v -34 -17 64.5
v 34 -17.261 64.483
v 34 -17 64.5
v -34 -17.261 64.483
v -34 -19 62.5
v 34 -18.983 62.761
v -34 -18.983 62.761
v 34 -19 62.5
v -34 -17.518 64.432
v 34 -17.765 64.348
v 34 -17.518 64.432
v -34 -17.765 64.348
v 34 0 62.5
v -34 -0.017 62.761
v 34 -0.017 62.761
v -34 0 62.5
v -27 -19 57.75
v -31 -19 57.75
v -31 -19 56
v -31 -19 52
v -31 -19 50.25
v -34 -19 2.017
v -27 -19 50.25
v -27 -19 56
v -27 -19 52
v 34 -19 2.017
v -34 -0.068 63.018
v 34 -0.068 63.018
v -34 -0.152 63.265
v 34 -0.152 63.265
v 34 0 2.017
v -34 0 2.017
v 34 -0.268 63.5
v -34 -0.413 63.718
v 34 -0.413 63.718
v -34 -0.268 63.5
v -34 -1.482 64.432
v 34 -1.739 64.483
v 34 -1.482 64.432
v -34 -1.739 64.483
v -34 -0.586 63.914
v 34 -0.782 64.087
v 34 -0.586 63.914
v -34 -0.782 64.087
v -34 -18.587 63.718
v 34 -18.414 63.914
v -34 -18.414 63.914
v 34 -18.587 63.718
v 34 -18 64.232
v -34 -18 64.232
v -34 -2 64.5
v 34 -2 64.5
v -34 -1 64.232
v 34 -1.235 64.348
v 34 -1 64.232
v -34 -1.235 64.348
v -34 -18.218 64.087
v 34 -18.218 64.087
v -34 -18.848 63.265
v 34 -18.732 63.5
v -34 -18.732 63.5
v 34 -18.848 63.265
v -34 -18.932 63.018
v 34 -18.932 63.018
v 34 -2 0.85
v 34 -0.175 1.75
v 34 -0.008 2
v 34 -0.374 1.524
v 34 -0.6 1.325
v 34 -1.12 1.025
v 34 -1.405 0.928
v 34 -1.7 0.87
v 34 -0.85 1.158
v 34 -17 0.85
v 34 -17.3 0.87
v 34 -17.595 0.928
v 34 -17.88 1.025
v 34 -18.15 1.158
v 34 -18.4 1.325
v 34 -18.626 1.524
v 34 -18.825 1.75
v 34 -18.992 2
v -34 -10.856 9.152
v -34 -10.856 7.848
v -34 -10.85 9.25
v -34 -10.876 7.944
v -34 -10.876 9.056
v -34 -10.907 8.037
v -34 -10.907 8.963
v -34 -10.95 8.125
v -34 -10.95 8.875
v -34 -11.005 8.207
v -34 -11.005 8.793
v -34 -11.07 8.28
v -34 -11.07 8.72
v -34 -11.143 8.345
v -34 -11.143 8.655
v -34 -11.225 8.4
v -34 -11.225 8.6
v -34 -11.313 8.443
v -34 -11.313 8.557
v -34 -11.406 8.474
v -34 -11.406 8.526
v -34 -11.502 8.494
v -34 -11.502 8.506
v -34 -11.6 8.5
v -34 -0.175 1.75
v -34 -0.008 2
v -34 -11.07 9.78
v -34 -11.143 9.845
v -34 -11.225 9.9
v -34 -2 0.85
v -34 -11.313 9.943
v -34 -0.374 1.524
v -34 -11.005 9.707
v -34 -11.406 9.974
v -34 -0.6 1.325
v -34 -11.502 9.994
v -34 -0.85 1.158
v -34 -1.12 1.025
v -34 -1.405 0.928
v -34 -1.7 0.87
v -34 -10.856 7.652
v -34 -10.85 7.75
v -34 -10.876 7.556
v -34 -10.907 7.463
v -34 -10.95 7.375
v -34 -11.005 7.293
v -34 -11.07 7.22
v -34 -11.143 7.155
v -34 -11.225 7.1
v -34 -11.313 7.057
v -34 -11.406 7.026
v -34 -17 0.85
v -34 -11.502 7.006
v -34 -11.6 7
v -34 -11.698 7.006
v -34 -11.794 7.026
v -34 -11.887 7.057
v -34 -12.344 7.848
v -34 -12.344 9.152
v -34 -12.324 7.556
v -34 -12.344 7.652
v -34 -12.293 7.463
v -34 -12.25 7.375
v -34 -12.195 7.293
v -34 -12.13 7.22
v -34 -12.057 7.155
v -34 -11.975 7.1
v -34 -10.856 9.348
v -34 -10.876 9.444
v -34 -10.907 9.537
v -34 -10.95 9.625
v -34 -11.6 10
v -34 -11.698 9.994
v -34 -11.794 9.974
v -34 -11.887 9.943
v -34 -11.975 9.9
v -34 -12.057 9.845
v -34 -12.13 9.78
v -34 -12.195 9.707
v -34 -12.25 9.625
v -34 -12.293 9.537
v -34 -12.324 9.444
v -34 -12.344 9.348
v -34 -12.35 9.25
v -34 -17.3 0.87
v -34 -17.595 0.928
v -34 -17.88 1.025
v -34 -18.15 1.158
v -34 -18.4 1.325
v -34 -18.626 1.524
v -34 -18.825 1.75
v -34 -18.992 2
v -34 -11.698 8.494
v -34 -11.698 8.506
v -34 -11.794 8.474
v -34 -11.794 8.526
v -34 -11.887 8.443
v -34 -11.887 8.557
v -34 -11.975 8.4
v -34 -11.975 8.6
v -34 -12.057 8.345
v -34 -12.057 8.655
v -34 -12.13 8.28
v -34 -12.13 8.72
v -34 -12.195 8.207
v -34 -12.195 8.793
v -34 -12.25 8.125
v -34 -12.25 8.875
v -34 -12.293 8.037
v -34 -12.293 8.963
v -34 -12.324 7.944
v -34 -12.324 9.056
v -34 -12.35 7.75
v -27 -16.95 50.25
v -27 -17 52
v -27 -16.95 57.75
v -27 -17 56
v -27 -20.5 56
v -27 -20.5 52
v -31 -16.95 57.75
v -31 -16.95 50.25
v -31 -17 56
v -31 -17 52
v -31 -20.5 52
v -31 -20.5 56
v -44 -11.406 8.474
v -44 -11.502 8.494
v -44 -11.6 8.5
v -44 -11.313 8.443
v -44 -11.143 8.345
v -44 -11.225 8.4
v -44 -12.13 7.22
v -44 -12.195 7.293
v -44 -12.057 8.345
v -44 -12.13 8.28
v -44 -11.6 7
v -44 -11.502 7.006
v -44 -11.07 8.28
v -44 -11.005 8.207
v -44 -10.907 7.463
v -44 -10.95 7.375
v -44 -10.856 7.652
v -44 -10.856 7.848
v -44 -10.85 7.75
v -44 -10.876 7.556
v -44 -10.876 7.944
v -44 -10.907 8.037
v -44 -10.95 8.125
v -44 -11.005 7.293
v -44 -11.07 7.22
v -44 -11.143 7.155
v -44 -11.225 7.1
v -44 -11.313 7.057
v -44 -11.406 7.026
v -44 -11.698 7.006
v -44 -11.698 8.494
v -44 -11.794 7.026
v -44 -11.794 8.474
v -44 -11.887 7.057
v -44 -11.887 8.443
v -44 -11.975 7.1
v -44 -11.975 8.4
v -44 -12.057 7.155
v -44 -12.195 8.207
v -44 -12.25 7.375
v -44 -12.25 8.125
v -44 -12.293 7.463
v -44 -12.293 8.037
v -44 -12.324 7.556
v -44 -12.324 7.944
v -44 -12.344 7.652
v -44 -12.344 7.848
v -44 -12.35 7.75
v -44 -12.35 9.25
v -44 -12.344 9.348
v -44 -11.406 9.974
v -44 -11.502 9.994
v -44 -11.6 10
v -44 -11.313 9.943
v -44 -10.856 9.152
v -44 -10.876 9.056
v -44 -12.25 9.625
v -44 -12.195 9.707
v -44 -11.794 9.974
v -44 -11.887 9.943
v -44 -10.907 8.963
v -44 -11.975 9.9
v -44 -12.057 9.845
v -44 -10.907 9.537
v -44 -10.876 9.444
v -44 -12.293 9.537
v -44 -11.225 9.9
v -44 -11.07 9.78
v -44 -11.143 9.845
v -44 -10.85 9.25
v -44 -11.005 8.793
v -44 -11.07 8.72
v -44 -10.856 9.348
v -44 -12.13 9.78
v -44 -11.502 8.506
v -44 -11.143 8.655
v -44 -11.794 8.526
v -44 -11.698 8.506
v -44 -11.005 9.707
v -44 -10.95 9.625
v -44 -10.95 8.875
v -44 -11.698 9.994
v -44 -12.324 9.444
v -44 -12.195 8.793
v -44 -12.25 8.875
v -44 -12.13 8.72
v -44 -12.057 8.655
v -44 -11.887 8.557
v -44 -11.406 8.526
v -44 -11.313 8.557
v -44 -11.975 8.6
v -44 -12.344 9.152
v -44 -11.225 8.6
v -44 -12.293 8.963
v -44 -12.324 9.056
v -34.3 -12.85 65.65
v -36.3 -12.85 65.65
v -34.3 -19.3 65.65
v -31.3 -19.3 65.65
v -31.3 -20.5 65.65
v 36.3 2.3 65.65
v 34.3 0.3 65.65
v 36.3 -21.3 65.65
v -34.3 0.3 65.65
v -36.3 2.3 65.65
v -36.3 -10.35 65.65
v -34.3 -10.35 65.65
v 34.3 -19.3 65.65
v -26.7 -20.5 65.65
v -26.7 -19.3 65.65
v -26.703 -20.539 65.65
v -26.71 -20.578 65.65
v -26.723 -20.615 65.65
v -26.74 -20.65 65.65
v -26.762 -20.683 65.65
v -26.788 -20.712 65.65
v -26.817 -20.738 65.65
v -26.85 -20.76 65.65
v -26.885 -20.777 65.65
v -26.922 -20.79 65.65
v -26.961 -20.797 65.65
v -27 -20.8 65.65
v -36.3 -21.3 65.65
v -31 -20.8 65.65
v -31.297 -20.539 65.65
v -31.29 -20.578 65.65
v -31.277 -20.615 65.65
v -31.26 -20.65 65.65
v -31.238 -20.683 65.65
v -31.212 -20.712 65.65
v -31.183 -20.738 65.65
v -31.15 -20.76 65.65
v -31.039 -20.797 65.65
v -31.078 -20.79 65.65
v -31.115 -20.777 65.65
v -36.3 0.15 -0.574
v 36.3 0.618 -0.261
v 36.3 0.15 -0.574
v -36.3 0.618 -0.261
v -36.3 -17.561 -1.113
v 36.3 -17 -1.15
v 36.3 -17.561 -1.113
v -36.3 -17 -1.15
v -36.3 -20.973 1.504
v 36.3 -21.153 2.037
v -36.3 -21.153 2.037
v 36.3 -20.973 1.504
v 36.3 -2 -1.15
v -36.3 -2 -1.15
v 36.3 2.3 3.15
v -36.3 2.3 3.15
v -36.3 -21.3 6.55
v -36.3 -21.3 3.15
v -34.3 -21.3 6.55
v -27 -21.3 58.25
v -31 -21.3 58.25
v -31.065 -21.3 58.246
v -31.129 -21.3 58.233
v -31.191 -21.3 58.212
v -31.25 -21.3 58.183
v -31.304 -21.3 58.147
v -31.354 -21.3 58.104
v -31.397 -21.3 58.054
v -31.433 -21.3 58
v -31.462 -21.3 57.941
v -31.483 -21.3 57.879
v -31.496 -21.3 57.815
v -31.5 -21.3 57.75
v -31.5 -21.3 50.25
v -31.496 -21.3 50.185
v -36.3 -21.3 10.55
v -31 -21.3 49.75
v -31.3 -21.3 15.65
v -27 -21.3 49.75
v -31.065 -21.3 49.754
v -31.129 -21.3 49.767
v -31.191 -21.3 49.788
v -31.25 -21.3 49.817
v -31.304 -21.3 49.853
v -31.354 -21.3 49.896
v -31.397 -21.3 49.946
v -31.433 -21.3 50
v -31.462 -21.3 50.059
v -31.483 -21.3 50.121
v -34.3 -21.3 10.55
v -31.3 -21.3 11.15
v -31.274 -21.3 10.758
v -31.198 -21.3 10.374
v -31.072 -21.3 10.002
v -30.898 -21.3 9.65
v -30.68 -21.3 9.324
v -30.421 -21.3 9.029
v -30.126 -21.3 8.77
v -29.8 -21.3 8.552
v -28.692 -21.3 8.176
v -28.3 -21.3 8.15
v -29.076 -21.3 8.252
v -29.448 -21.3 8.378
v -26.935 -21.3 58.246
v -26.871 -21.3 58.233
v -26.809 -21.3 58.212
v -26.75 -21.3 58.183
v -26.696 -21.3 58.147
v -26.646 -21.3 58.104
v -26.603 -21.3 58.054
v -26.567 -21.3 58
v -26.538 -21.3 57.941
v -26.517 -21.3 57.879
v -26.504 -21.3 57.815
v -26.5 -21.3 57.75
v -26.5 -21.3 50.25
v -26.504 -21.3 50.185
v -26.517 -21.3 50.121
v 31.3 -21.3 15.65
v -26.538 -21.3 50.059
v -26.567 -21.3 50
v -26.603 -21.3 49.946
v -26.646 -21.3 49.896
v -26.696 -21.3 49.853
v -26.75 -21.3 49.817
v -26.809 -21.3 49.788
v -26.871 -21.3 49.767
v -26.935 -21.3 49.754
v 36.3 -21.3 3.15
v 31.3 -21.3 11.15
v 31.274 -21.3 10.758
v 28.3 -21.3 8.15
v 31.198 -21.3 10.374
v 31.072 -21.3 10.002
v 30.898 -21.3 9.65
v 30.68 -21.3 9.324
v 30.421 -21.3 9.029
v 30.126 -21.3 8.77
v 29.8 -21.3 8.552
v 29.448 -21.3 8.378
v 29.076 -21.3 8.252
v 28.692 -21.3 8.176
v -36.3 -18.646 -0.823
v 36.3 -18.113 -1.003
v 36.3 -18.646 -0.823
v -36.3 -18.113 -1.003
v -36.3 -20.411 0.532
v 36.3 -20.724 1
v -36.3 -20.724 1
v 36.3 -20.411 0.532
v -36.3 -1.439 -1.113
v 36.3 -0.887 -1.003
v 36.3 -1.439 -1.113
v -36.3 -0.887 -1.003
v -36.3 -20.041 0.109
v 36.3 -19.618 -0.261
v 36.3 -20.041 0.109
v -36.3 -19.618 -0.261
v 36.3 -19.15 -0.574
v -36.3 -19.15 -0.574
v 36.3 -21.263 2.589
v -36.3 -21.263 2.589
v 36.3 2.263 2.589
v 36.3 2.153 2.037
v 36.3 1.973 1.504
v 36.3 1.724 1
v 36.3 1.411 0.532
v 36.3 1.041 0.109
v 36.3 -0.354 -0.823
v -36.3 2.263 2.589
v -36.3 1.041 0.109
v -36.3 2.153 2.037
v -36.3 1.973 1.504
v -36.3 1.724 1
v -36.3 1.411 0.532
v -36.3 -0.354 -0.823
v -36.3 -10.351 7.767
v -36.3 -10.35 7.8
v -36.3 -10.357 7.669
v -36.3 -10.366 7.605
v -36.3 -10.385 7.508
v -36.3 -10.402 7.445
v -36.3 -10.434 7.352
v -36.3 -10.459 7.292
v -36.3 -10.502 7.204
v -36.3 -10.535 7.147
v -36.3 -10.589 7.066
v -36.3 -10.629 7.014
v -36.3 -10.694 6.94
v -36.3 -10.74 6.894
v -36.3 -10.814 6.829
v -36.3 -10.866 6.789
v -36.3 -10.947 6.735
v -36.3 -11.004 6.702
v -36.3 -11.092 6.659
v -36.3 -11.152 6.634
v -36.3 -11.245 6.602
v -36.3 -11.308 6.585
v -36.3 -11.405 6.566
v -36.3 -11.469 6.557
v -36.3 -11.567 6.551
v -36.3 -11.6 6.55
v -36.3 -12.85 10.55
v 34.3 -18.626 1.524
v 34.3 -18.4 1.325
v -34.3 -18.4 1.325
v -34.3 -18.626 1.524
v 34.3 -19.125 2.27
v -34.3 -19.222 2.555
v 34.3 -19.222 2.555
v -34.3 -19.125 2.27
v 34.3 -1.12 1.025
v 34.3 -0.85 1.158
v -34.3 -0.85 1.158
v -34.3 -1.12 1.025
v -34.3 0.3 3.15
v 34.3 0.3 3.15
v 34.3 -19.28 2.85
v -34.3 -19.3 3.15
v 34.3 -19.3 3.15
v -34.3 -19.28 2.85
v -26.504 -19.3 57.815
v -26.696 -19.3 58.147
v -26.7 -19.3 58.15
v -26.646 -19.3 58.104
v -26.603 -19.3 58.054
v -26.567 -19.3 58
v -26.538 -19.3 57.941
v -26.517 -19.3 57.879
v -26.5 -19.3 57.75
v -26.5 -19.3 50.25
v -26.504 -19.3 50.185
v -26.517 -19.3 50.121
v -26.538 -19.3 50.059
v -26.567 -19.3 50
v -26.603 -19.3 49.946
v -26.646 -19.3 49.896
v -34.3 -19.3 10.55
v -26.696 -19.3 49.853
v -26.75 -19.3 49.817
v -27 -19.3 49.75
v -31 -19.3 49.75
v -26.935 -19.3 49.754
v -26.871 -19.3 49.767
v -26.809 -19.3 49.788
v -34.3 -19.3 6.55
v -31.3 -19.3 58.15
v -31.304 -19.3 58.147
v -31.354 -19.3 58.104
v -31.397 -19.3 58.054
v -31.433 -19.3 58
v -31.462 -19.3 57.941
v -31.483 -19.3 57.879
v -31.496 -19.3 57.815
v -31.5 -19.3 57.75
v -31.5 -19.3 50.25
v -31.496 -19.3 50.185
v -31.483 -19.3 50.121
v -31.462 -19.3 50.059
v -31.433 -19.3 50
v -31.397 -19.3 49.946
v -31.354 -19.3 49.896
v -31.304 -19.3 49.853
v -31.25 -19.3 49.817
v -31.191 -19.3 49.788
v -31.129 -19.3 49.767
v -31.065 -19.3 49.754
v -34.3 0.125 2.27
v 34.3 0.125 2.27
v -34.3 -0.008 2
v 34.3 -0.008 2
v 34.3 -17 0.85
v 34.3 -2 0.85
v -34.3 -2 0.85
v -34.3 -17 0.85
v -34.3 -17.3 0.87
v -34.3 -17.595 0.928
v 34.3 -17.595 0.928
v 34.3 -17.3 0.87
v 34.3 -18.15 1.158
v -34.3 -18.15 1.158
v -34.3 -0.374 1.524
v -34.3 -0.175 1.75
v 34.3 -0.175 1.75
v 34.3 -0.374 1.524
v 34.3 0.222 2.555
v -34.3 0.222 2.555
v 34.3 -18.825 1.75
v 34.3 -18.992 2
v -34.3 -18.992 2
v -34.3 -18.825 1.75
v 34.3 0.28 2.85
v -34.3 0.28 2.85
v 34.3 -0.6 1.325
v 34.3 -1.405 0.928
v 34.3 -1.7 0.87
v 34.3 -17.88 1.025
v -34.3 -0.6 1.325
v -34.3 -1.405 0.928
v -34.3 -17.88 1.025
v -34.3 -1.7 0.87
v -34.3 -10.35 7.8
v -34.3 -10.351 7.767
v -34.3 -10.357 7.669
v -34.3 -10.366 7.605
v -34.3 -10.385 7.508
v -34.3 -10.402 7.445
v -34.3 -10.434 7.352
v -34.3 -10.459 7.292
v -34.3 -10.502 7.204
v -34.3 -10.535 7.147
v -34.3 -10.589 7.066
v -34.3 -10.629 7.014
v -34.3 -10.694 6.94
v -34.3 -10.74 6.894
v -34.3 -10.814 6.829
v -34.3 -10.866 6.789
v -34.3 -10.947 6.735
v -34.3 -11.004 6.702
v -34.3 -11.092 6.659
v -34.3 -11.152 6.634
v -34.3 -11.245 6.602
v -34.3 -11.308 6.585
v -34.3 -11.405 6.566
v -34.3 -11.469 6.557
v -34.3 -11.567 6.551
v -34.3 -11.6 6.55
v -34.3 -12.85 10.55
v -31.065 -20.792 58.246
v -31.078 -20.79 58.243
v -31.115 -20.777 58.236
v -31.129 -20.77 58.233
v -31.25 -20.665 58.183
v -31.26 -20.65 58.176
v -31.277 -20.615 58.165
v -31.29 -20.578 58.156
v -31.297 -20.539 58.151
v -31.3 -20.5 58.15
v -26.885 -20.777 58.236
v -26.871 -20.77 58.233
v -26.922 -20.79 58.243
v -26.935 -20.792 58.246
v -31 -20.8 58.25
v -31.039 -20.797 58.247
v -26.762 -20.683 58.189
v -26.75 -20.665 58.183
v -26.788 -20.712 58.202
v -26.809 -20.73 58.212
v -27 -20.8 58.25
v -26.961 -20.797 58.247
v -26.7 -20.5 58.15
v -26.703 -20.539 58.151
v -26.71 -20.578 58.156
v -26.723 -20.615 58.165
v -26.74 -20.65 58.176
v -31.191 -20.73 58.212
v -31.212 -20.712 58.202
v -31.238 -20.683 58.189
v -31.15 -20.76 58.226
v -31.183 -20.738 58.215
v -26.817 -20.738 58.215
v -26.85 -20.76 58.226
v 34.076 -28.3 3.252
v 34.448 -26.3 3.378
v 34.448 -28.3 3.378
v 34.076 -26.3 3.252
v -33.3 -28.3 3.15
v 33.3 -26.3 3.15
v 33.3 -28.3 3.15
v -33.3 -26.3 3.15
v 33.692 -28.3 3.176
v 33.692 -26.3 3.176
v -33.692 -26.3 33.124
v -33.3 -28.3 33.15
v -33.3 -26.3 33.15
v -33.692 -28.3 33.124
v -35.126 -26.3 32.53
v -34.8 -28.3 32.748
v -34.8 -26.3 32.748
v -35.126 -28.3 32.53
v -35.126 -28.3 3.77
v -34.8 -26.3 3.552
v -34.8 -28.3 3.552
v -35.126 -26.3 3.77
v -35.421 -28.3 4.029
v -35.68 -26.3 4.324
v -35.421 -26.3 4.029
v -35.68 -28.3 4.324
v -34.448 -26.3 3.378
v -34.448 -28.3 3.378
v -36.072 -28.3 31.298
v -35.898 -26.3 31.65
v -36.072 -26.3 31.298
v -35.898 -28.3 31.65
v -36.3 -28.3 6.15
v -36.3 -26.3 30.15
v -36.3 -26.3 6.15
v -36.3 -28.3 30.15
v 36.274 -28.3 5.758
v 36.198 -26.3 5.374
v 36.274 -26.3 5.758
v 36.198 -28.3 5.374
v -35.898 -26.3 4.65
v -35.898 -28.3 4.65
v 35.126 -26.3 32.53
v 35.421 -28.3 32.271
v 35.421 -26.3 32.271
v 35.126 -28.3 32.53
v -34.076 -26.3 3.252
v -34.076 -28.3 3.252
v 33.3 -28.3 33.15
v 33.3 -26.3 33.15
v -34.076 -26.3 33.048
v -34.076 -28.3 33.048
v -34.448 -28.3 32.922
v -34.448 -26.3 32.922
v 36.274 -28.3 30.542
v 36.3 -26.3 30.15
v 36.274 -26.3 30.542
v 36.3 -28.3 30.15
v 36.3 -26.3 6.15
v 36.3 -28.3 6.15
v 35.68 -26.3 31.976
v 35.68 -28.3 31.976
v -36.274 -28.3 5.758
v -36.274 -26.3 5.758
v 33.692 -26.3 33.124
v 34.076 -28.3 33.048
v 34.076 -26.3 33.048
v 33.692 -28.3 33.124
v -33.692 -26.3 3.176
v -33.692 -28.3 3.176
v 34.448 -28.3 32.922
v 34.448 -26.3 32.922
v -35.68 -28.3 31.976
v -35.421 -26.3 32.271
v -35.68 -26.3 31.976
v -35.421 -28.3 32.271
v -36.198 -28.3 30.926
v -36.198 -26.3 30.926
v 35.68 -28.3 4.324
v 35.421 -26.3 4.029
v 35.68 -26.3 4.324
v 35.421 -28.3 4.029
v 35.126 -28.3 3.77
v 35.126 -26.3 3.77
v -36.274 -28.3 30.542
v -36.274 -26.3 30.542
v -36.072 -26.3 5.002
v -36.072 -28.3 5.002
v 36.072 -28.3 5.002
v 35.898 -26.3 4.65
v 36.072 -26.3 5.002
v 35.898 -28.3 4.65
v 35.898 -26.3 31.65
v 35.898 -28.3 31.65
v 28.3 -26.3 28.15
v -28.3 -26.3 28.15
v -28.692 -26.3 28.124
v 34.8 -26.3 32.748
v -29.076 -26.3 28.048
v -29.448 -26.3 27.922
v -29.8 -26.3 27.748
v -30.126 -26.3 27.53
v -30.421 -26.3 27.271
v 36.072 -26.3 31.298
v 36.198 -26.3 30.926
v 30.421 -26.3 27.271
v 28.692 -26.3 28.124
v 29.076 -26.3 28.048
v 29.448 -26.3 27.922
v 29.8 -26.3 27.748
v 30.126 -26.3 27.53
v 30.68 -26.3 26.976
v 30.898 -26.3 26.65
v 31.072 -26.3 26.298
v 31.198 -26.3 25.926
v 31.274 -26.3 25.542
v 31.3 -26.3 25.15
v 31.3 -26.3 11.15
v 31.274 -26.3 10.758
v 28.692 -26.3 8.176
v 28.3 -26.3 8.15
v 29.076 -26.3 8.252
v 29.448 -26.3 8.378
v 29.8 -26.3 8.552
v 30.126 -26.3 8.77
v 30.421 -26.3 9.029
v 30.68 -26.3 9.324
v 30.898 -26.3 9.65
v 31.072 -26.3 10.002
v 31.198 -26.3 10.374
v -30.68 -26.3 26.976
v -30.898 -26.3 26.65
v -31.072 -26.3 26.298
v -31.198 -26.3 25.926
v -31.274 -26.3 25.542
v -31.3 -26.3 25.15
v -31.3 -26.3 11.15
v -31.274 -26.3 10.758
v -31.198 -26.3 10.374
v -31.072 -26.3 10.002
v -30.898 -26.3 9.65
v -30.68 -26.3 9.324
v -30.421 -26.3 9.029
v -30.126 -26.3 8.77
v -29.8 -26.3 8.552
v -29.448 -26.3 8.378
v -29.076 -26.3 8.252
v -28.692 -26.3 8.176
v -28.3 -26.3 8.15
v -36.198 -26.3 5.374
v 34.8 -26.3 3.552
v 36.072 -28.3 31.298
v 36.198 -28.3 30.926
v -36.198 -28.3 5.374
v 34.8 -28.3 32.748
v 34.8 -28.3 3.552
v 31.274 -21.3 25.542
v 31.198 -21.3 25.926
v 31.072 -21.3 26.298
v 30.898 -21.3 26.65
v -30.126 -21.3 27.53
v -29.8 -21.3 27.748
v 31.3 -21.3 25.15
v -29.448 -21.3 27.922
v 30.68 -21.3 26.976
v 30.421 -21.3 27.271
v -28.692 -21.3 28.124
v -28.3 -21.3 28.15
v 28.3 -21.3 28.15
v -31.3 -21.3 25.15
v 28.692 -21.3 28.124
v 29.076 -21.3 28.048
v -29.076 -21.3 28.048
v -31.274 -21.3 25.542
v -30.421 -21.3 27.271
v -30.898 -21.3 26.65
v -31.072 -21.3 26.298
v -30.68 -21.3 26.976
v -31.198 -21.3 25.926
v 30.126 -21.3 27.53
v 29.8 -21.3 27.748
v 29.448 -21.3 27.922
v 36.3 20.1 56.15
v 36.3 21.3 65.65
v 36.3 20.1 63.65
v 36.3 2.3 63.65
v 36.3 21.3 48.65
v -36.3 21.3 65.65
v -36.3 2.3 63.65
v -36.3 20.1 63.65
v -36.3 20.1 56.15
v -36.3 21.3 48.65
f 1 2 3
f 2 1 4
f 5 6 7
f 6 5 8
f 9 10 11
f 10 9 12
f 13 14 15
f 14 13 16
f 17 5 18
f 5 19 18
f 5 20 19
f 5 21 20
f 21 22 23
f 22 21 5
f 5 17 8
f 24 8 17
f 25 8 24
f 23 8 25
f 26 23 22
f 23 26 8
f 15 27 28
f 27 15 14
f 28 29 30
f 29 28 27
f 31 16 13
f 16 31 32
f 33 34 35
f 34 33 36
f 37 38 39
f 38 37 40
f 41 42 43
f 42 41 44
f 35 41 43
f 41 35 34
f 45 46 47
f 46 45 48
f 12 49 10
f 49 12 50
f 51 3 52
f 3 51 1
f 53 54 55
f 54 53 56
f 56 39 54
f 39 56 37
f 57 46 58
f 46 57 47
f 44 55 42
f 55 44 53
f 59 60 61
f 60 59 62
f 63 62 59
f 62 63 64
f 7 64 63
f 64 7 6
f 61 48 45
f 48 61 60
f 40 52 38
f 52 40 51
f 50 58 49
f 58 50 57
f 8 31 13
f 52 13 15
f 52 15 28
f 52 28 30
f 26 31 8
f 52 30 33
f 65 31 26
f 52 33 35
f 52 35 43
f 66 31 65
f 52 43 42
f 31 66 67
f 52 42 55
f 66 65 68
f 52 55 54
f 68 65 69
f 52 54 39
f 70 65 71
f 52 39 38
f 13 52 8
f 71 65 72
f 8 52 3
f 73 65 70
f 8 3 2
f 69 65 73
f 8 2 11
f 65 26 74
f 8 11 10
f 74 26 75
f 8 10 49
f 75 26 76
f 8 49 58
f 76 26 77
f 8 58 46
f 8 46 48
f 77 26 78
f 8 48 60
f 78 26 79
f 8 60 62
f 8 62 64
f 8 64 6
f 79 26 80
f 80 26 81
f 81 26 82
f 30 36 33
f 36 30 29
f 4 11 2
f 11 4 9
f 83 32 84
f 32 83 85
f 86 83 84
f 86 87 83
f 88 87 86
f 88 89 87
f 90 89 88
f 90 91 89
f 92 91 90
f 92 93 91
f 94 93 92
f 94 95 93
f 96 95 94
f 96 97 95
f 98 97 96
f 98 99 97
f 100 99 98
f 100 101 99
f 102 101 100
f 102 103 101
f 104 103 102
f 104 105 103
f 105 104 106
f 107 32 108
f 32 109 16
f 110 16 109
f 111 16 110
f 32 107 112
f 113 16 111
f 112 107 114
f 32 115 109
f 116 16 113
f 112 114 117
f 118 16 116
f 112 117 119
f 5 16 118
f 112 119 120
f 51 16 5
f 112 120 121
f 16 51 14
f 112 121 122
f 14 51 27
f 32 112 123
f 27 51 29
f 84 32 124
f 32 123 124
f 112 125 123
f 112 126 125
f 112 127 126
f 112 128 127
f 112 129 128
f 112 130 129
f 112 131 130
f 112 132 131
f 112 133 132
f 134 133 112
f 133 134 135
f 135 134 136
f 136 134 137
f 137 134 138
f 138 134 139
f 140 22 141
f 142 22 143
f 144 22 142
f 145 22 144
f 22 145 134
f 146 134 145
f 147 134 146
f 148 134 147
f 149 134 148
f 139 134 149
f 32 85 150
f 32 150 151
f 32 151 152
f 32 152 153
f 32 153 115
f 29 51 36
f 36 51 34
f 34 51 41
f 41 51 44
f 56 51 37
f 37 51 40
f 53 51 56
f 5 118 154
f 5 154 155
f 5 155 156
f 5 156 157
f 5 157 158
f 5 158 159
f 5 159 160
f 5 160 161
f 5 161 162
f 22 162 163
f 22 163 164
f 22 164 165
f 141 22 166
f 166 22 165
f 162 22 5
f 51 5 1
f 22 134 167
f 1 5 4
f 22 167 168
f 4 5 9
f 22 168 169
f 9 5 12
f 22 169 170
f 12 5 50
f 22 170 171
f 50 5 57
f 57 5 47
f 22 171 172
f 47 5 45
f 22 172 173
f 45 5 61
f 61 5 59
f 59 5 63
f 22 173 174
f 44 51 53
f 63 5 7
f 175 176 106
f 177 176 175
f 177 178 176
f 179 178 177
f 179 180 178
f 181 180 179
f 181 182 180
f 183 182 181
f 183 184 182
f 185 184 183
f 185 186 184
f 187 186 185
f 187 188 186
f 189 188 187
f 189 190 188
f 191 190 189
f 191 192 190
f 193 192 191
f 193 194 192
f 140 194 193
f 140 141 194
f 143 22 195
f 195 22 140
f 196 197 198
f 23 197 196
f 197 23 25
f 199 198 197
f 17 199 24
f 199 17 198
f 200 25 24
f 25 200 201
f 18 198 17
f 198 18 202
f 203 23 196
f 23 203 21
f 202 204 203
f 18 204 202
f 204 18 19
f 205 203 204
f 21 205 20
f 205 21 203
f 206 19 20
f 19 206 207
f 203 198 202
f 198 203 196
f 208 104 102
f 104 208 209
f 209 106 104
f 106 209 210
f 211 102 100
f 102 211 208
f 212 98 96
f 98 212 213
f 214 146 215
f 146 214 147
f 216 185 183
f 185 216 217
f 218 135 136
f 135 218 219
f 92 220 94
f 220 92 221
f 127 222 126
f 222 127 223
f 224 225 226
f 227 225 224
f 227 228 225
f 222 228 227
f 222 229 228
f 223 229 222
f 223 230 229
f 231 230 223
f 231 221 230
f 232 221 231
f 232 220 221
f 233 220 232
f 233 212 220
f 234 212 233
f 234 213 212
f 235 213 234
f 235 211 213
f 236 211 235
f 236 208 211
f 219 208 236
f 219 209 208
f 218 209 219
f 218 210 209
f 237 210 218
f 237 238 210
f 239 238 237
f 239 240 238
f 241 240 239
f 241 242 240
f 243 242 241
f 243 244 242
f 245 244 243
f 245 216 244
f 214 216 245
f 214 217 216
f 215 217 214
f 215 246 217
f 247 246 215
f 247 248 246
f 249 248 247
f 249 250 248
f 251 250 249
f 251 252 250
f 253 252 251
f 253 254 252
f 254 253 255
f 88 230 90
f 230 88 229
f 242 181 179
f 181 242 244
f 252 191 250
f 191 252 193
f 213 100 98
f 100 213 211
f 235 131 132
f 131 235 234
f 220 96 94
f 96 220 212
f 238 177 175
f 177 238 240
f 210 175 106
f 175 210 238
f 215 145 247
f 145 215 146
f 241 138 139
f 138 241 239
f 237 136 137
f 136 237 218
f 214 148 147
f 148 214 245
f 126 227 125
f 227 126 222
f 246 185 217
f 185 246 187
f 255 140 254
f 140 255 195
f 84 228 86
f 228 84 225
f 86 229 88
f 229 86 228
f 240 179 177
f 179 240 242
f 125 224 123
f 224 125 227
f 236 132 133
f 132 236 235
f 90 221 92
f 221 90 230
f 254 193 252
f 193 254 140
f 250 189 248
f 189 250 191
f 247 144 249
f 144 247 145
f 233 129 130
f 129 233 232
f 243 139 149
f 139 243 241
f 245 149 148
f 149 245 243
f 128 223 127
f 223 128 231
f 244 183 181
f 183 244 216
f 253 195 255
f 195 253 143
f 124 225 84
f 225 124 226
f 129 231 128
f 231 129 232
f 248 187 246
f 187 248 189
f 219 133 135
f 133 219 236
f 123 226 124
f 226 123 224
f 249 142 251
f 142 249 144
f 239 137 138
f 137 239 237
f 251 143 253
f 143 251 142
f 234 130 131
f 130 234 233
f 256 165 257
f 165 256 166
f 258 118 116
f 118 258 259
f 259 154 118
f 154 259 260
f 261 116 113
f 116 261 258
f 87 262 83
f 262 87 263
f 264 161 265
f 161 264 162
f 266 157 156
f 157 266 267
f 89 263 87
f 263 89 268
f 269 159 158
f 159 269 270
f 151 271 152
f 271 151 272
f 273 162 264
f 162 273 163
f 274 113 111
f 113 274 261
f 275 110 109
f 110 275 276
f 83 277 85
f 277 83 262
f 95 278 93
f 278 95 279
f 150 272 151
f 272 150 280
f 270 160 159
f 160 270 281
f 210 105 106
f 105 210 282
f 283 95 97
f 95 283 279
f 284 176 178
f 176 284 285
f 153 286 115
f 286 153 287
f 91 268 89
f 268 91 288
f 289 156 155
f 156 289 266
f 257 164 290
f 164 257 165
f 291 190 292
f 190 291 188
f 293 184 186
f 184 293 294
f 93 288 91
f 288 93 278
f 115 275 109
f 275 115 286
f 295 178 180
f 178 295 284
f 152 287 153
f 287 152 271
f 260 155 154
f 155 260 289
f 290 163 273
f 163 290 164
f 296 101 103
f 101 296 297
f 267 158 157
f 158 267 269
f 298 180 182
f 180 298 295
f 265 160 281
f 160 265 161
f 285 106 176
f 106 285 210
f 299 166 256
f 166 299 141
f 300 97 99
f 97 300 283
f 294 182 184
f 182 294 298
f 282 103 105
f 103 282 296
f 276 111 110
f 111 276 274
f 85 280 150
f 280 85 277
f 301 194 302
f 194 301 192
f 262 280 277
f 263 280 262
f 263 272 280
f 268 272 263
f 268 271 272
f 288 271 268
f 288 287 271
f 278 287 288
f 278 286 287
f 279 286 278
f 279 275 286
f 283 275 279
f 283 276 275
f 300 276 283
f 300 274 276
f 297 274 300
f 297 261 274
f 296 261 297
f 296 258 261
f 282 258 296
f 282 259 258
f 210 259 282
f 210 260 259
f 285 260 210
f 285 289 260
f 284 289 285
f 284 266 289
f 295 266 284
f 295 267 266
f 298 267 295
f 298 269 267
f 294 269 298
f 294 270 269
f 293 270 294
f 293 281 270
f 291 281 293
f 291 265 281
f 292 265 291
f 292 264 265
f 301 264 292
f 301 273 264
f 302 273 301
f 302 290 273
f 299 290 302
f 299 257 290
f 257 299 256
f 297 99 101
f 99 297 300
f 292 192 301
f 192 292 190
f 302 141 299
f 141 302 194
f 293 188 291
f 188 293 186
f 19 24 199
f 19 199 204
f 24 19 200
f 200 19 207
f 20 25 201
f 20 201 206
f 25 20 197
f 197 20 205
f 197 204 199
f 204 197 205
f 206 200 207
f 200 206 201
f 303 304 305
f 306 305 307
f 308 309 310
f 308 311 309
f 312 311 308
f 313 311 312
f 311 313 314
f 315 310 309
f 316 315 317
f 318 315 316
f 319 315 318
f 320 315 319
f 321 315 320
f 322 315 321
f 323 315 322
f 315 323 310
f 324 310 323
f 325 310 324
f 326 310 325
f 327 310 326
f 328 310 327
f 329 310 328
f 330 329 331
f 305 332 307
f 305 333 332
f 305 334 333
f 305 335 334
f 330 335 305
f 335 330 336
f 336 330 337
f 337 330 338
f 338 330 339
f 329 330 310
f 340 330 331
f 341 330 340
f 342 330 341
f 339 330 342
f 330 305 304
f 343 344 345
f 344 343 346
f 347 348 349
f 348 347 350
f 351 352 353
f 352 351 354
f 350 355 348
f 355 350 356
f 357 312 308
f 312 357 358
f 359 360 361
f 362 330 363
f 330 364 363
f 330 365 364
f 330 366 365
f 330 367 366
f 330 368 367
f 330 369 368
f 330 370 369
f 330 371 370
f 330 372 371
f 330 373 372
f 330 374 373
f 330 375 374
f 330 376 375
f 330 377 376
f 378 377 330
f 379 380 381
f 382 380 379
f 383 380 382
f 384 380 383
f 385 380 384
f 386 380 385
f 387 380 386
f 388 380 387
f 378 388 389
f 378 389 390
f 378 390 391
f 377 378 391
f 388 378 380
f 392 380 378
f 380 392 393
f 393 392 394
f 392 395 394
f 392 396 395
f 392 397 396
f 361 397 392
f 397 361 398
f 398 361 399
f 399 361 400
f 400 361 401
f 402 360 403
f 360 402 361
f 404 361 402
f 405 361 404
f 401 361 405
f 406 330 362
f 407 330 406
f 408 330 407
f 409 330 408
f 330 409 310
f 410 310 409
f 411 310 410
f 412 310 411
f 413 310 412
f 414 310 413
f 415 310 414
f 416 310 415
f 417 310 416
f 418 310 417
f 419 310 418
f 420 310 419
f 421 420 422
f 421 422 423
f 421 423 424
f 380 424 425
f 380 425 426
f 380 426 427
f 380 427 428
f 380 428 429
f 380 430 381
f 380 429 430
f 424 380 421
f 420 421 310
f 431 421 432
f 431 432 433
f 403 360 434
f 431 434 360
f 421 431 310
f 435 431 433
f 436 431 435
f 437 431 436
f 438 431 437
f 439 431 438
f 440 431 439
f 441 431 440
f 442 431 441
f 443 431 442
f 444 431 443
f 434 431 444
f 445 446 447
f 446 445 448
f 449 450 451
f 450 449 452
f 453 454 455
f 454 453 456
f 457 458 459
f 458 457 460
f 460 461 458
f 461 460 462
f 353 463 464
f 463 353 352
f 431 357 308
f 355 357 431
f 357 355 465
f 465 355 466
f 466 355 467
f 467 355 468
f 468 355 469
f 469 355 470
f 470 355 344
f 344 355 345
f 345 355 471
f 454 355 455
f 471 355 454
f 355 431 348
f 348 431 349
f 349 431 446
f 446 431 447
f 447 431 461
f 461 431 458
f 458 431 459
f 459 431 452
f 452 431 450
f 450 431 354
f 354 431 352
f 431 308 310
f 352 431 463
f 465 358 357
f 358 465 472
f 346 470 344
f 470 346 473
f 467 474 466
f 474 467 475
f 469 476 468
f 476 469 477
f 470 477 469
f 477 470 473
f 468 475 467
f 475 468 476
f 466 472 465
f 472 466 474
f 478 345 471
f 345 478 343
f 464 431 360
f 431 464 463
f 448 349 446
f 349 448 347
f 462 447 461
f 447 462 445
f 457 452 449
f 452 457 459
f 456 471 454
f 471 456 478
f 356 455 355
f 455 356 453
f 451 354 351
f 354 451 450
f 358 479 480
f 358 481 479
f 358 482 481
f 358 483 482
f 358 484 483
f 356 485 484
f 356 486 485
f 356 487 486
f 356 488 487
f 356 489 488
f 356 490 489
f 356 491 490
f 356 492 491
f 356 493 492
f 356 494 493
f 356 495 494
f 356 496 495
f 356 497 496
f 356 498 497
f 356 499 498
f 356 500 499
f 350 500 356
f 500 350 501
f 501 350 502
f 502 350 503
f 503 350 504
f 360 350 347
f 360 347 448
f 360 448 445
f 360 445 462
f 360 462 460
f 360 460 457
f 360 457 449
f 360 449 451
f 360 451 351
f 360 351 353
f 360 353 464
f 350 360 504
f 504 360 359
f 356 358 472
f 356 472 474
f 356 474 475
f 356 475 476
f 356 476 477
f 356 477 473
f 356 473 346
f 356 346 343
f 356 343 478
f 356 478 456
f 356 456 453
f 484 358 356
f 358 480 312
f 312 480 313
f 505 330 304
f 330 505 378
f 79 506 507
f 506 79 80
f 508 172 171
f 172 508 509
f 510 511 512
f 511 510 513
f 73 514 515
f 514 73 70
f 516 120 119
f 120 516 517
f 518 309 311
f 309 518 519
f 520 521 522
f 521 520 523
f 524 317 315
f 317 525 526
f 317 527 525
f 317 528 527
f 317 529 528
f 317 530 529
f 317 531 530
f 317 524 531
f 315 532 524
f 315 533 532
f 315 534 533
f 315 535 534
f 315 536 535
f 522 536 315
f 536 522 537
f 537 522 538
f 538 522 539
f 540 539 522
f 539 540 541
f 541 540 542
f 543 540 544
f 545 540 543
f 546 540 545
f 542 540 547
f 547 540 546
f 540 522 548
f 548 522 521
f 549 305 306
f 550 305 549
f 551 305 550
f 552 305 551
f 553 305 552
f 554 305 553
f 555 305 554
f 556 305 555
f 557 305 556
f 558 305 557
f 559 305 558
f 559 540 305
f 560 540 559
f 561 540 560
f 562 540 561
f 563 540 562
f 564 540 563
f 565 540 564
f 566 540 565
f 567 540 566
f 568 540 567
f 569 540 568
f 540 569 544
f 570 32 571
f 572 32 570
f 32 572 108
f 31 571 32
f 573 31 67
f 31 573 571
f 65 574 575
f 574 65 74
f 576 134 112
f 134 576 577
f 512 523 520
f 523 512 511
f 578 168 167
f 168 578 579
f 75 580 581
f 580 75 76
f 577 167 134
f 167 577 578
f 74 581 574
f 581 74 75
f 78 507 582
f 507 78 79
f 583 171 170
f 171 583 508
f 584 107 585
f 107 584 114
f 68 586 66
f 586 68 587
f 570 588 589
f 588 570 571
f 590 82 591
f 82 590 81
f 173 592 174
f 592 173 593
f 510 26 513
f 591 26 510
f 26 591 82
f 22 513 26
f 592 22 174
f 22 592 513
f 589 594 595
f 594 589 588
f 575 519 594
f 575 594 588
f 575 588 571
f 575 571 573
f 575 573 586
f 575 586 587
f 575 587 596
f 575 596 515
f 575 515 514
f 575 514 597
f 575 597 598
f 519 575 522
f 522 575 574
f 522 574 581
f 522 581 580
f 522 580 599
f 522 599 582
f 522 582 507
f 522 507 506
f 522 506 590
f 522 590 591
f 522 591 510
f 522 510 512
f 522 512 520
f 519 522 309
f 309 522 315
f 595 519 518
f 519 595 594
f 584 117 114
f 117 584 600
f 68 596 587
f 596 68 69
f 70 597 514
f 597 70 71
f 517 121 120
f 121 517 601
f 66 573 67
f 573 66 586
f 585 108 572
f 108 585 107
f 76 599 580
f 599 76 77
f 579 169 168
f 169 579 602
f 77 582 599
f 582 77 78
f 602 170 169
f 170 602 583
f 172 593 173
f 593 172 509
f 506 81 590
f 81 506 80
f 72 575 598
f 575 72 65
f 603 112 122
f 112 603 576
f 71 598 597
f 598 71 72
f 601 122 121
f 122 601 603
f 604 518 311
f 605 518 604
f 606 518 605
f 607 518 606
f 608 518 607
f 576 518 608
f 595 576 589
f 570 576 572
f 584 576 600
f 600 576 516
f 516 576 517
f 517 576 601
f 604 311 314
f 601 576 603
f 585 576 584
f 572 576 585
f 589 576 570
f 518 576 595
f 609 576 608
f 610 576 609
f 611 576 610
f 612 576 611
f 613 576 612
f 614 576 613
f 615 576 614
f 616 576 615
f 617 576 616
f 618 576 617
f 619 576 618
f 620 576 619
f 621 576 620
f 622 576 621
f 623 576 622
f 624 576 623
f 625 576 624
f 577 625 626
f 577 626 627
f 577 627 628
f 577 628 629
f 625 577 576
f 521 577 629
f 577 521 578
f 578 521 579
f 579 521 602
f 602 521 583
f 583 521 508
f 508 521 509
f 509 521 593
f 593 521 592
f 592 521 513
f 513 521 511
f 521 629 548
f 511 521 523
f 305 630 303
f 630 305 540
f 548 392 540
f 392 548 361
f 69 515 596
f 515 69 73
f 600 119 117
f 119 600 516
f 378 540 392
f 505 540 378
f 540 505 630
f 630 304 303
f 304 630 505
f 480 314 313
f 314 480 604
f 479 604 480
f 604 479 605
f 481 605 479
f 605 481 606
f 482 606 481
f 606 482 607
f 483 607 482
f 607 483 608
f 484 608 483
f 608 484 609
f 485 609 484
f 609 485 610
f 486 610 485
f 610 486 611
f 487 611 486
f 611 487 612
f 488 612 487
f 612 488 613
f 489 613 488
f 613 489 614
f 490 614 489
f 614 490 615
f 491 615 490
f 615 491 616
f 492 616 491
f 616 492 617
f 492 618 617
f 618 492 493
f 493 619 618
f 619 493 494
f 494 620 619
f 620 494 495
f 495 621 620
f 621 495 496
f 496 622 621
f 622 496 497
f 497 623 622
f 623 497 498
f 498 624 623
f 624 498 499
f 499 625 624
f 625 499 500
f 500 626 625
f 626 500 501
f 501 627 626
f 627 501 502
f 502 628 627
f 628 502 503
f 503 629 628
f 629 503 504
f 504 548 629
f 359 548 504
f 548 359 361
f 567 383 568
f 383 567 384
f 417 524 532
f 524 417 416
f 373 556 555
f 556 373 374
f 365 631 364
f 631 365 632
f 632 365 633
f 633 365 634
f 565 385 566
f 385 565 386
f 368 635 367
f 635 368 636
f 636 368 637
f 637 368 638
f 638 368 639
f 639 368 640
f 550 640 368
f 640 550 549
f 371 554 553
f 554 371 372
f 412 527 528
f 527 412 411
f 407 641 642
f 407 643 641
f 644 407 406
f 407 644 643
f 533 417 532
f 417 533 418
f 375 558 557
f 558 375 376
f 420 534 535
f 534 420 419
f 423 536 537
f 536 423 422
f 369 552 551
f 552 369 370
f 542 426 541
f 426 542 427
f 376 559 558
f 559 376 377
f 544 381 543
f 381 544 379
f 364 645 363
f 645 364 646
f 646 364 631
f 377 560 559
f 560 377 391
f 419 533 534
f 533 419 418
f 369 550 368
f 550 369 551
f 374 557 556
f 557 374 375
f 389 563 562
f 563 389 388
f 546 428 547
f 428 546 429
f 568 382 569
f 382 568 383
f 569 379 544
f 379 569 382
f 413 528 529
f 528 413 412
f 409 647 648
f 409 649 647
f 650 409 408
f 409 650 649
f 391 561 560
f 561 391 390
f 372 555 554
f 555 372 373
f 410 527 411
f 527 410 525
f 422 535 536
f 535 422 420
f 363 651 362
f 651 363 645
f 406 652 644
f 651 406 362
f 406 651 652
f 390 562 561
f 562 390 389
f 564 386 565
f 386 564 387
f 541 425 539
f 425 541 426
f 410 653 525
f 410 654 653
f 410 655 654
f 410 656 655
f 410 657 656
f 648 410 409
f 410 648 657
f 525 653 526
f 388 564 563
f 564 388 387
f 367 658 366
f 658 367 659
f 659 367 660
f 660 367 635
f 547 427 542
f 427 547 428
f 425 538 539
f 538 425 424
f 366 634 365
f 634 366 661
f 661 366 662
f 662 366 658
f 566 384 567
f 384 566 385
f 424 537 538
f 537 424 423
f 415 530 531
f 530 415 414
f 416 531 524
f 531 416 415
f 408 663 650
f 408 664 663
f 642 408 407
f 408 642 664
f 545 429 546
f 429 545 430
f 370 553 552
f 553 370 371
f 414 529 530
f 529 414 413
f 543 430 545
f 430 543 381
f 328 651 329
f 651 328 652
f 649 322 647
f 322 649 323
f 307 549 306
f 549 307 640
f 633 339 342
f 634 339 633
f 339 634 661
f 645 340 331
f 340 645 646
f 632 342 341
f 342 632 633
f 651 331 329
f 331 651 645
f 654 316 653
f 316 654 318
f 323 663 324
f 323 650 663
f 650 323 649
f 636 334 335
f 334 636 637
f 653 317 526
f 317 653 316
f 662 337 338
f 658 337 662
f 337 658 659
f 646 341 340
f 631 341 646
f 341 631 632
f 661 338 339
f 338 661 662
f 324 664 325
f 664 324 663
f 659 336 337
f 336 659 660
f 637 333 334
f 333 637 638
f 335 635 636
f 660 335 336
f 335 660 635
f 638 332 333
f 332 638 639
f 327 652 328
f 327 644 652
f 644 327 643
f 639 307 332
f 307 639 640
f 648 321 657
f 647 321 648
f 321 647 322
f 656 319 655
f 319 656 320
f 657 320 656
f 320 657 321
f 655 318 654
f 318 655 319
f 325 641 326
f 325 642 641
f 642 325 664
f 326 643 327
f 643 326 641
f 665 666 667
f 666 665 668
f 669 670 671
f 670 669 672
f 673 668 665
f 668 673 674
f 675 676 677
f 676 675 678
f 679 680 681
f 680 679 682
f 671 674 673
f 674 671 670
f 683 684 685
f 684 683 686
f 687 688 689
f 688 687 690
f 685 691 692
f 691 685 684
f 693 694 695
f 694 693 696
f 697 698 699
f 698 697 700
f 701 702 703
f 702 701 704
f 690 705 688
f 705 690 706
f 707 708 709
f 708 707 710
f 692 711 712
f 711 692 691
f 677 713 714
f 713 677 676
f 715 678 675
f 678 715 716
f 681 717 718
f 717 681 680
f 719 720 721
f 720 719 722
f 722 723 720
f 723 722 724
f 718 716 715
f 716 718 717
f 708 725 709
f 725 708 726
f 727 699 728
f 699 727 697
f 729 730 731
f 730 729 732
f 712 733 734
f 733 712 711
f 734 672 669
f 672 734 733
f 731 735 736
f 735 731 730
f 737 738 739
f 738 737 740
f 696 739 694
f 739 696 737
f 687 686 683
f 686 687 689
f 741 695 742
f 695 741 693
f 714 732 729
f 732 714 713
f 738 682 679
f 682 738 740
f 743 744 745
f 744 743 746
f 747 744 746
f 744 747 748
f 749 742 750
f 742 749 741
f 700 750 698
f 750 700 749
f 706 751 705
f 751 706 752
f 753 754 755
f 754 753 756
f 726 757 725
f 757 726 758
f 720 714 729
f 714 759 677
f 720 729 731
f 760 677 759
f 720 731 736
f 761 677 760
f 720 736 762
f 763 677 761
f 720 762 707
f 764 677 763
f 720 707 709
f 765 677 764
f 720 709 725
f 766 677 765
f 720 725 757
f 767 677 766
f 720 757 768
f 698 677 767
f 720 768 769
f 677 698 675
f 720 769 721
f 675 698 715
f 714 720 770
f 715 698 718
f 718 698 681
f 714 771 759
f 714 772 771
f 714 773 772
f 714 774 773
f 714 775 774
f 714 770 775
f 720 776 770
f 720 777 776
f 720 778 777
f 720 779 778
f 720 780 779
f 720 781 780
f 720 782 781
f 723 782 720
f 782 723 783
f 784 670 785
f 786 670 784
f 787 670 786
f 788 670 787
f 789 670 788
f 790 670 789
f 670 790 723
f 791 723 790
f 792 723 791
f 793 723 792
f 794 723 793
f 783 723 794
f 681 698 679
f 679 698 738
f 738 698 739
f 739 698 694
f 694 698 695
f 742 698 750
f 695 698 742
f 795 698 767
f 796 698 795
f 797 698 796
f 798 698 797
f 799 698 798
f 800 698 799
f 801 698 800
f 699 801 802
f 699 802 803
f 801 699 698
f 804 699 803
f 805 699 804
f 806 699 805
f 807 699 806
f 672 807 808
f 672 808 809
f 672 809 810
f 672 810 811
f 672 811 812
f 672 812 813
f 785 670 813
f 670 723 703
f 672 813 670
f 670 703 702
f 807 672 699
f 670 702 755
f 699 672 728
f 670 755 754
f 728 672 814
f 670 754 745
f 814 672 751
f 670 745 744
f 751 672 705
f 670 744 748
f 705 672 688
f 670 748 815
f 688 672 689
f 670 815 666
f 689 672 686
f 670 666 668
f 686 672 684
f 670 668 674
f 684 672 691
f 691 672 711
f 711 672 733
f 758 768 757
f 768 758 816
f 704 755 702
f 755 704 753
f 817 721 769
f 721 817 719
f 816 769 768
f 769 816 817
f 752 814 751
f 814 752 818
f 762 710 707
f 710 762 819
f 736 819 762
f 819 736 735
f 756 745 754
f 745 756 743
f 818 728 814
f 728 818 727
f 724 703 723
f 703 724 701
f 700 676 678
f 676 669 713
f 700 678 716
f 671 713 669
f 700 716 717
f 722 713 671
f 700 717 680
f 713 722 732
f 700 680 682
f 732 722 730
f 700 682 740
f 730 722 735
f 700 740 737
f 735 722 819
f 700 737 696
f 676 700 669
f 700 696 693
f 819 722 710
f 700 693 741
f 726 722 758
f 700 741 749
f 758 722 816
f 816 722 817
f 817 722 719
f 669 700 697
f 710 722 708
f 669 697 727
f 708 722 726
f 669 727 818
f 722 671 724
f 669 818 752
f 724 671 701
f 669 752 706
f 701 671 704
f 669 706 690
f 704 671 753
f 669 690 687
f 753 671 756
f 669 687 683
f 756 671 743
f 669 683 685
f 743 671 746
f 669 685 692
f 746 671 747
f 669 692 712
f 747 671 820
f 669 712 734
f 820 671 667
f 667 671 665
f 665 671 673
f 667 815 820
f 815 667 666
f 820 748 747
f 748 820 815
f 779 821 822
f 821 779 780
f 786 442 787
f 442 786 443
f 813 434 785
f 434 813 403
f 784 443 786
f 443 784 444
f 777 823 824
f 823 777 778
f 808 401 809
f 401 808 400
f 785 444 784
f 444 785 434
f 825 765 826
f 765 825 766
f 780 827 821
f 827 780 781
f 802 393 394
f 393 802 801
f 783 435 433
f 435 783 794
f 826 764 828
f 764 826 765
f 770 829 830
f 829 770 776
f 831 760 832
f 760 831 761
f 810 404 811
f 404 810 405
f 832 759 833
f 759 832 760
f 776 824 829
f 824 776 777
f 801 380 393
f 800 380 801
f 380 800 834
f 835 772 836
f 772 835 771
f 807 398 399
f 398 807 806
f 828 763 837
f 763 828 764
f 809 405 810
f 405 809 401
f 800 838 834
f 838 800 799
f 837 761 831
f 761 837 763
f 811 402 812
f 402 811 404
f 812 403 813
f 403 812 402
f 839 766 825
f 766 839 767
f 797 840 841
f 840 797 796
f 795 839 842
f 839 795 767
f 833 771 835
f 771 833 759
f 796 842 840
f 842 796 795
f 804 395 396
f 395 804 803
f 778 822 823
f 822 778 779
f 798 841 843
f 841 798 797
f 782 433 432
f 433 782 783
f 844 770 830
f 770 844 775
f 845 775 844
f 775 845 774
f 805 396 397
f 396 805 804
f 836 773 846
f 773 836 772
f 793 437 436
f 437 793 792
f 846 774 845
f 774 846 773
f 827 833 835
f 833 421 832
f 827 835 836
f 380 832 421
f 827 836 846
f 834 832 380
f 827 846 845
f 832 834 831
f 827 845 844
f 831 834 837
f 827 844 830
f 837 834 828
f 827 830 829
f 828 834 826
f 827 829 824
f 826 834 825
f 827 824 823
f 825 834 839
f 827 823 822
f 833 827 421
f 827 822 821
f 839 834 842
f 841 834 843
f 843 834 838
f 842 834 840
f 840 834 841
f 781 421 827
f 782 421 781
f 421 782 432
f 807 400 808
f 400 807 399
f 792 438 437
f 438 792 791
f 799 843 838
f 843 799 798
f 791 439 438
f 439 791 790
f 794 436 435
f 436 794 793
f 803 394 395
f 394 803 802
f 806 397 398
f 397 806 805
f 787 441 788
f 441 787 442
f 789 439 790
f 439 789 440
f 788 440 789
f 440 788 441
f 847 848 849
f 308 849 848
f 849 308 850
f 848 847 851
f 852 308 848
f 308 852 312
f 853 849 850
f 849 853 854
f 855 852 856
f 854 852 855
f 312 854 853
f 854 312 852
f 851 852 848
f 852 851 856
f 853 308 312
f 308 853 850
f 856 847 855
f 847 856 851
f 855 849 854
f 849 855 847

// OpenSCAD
/* [Battery Box] */
//oriented as on Window
batBoxDims=[68,19,64.5]; 
batBoxRad=2;
batBoxCblPos=[-34,-2.1,-23.75];
batBoxCblDias=1.5;
batBoxBtnPos=[-29,-9.5,21.75];
batBoxBtnDims=[4,1.5,7.5];
batBoxWallThck=2; //just for btn cutout
batBoxConDia=5.8;
batBoxConLen=10.6;

/* [Holder] */
//This depends on your window frame
hldrHookWdth=40;
hldrWallThck=2.0;
hldrBldThck=1.2;
hldrBldLen=15;
hldrOutRad=0.5; //not yet!
hldr2BoxSpcng=0.3;
hldr2CblSpcng=0.5;
hldr2BtnSpcng=0.5;


/* [Cable Spool] */
cblSpoolRad=3;
cblSpoolThck=5;

/* [WindowFrame] */
//distance front to frame
wndwFrmThck=19;

/* [show] */
showHldr=true;
showBox=true;

/* [Hidden] */
fudge=0.1;
hldrBxDims=batBoxDims + [(hldrWallThck+hldr2BoxSpcng)*2,(hldrWallThck+hldr2BoxSpcng)*2,(hldrWallThck+hldr2BoxSpcng)];
hldrBxRad=batBoxRad+hldr2BoxSpcng+hldrWallThck;

$fn=48;

translate([0,-batBoxDims.y/2,batBoxDims.z/2]){
 if (showBox) batBox();
 if (showHldr) holder();  
}

*batBox();
module batBox(){
  difference(){
  //body
    rotate([0,-90,0]) linear_extrude(batBoxDims.x,center=true) offset(batBoxRad) 
      square([batBoxDims.z-batBoxRad*2,batBoxDims.y-batBoxRad*2],true);
    translate(batBoxBtnPos+[0,batBoxWallThck/2,0]) 
      cube([batBoxBtnDims.x,batBoxWallThck+fudge,batBoxBtnDims.z],true);
  }
  // cables
  translate(batBoxCblPos) rotate([0,-90,0]) 
    for(i=[-1,1]) translate([i*batBoxCblDias/2,0,0]) cylinder(d=batBoxCblDias,h=10);

  //button
  translate(batBoxBtnPos+[0,(batBoxBtnDims.y+batBoxWallThck)/2-batBoxBtnDims.y,0]) 
    cube([batBoxBtnDims.x,batBoxBtnDims.y+batBoxWallThck,batBoxBtnDims.x],true);
}  

module holder(){
  slitLen=hldrBxDims.z/2-batBoxCblPos.z+batBoxCblDias/2;
  cblSpoolHght=30;
  cblSpoolZPos=-hldrBxDims.z/2+cblSpoolHght/2+batBoxRad+hldrWallThck+hldr2BoxSpcng;
  //body
  rotate([0,-90,0])
    difference(){
        linear_extrude(hldrBxDims.x,center=true) semiRndSquare([hldrBxDims.z,hldrBxDims.y],hldrBxRad);
        linear_extrude(hldrBxDims.x-hldrWallThck*2,center=true) 
          translate([(hldrWallThck+fudge)/2,0,0]) 
            semiRndSquare([hldrBxDims.z-hldrWallThck+fudge,hldrBxDims.y-hldrWallThck*2],hldrBxRad-hldrWallThck);
      //cable slit
      translate([(hldrBxDims.z-slitLen+fudge)/2,batBoxCblPos.y,hldrBxDims.x/2-hldrWallThck]) 
        linear_extrude(hldrWallThck+fudge) offset(hldr2CblSpcng){
          square([slitLen,batBoxCblDias],true);
          translate([-slitLen/2,0]) circle(d=batBoxCblDias);
          #translate([-slitLen/2+batBoxCblDias/2,-(batBoxDims.y/2-batBoxCblPos.y)/2]) square([batBoxCblDias*2,batBoxDims.y/2-batBoxCblPos.y],true);
        }
      //Button Window
      translate([batBoxBtnPos.z,0,-batBoxBtnPos.x]) rotate([90,0,0]) 
        linear_extrude(hldrBxDims.y/2+fudge) offset(hldr2BtnSpcng) square([batBoxBtnDims.z,batBoxBtnDims.x],true);
      //Button cutout channel
      translate([batBoxBtnPos.z,-batBoxDims.y/2,-batBoxBtnPos.x]) rotate([0,90,0])
        linear_extrude(hldrBxDims.z/2-batBoxBtnPos.z+fudge) offset(hldr2BoxSpcng) square([batBoxBtnDims.x,batBoxBtnDims.y*2],true);
    }
  //clamp roof
  translate([0,(hldrBxDims.y+wndwFrmThck)/2,(hldrBxDims.z-hldrWallThck)/2]) cube([hldrBxDims.x,wndwFrmThck,hldrWallThck],true);
  //clamp blade
  translate([0,hldrBxDims.y/2+wndwFrmThck,hldrBxDims.z/2-hldrBldLen-hldrWallThck]) 
    rotate([90,0,-90]) linear_extrude(hldrBxDims.x,center=true) 
      polygon([[0,0],[0,hldrBldLen],[hldrBldThck,hldrBldLen],[hldrBldThck,hldrBldLen/2]]);
  //cable Spool Front
  translate([0,-hldrBxDims.y/2-cblSpoolThck,cblSpoolZPos]) rotate([90,0,0]){ 
    linear_extrude(hldrWallThck) offset(cblSpoolRad) square([hldrBxDims.x-cblSpoolRad*2,cblSpoolHght-cblSpoolRad*2],true);
    //cable Spool Core
    translate([0,0,-cblSpoolThck]) linear_extrude(cblSpoolThck) offset(cblSpoolRad) 
      square([hldrBxDims.x-(cblSpoolRad+cblSpoolThck)*2,cblSpoolHght-(cblSpoolRad+cblSpoolThck)*2],true);
  }
  
}


module rndSquare(size, rad){
  offset(rad) 
    square([size.x-rad*2,size.y-rad*2],true);
}

module semiRndSquare(size, rad){
  offset(rad) 
    square([size.x-rad*2,size.y-rad*2],true);
  translate([(size.x-rad)/2,0]) square([rad,size.y],true);
}

*bvldSlot();
module bvldSlot(size=[5,10,2], rad=1){
  rotate_extrude(angle=90) translate([rad,0]) difference(){
    square(size.z);
    circle(size.z);
  }

}  
